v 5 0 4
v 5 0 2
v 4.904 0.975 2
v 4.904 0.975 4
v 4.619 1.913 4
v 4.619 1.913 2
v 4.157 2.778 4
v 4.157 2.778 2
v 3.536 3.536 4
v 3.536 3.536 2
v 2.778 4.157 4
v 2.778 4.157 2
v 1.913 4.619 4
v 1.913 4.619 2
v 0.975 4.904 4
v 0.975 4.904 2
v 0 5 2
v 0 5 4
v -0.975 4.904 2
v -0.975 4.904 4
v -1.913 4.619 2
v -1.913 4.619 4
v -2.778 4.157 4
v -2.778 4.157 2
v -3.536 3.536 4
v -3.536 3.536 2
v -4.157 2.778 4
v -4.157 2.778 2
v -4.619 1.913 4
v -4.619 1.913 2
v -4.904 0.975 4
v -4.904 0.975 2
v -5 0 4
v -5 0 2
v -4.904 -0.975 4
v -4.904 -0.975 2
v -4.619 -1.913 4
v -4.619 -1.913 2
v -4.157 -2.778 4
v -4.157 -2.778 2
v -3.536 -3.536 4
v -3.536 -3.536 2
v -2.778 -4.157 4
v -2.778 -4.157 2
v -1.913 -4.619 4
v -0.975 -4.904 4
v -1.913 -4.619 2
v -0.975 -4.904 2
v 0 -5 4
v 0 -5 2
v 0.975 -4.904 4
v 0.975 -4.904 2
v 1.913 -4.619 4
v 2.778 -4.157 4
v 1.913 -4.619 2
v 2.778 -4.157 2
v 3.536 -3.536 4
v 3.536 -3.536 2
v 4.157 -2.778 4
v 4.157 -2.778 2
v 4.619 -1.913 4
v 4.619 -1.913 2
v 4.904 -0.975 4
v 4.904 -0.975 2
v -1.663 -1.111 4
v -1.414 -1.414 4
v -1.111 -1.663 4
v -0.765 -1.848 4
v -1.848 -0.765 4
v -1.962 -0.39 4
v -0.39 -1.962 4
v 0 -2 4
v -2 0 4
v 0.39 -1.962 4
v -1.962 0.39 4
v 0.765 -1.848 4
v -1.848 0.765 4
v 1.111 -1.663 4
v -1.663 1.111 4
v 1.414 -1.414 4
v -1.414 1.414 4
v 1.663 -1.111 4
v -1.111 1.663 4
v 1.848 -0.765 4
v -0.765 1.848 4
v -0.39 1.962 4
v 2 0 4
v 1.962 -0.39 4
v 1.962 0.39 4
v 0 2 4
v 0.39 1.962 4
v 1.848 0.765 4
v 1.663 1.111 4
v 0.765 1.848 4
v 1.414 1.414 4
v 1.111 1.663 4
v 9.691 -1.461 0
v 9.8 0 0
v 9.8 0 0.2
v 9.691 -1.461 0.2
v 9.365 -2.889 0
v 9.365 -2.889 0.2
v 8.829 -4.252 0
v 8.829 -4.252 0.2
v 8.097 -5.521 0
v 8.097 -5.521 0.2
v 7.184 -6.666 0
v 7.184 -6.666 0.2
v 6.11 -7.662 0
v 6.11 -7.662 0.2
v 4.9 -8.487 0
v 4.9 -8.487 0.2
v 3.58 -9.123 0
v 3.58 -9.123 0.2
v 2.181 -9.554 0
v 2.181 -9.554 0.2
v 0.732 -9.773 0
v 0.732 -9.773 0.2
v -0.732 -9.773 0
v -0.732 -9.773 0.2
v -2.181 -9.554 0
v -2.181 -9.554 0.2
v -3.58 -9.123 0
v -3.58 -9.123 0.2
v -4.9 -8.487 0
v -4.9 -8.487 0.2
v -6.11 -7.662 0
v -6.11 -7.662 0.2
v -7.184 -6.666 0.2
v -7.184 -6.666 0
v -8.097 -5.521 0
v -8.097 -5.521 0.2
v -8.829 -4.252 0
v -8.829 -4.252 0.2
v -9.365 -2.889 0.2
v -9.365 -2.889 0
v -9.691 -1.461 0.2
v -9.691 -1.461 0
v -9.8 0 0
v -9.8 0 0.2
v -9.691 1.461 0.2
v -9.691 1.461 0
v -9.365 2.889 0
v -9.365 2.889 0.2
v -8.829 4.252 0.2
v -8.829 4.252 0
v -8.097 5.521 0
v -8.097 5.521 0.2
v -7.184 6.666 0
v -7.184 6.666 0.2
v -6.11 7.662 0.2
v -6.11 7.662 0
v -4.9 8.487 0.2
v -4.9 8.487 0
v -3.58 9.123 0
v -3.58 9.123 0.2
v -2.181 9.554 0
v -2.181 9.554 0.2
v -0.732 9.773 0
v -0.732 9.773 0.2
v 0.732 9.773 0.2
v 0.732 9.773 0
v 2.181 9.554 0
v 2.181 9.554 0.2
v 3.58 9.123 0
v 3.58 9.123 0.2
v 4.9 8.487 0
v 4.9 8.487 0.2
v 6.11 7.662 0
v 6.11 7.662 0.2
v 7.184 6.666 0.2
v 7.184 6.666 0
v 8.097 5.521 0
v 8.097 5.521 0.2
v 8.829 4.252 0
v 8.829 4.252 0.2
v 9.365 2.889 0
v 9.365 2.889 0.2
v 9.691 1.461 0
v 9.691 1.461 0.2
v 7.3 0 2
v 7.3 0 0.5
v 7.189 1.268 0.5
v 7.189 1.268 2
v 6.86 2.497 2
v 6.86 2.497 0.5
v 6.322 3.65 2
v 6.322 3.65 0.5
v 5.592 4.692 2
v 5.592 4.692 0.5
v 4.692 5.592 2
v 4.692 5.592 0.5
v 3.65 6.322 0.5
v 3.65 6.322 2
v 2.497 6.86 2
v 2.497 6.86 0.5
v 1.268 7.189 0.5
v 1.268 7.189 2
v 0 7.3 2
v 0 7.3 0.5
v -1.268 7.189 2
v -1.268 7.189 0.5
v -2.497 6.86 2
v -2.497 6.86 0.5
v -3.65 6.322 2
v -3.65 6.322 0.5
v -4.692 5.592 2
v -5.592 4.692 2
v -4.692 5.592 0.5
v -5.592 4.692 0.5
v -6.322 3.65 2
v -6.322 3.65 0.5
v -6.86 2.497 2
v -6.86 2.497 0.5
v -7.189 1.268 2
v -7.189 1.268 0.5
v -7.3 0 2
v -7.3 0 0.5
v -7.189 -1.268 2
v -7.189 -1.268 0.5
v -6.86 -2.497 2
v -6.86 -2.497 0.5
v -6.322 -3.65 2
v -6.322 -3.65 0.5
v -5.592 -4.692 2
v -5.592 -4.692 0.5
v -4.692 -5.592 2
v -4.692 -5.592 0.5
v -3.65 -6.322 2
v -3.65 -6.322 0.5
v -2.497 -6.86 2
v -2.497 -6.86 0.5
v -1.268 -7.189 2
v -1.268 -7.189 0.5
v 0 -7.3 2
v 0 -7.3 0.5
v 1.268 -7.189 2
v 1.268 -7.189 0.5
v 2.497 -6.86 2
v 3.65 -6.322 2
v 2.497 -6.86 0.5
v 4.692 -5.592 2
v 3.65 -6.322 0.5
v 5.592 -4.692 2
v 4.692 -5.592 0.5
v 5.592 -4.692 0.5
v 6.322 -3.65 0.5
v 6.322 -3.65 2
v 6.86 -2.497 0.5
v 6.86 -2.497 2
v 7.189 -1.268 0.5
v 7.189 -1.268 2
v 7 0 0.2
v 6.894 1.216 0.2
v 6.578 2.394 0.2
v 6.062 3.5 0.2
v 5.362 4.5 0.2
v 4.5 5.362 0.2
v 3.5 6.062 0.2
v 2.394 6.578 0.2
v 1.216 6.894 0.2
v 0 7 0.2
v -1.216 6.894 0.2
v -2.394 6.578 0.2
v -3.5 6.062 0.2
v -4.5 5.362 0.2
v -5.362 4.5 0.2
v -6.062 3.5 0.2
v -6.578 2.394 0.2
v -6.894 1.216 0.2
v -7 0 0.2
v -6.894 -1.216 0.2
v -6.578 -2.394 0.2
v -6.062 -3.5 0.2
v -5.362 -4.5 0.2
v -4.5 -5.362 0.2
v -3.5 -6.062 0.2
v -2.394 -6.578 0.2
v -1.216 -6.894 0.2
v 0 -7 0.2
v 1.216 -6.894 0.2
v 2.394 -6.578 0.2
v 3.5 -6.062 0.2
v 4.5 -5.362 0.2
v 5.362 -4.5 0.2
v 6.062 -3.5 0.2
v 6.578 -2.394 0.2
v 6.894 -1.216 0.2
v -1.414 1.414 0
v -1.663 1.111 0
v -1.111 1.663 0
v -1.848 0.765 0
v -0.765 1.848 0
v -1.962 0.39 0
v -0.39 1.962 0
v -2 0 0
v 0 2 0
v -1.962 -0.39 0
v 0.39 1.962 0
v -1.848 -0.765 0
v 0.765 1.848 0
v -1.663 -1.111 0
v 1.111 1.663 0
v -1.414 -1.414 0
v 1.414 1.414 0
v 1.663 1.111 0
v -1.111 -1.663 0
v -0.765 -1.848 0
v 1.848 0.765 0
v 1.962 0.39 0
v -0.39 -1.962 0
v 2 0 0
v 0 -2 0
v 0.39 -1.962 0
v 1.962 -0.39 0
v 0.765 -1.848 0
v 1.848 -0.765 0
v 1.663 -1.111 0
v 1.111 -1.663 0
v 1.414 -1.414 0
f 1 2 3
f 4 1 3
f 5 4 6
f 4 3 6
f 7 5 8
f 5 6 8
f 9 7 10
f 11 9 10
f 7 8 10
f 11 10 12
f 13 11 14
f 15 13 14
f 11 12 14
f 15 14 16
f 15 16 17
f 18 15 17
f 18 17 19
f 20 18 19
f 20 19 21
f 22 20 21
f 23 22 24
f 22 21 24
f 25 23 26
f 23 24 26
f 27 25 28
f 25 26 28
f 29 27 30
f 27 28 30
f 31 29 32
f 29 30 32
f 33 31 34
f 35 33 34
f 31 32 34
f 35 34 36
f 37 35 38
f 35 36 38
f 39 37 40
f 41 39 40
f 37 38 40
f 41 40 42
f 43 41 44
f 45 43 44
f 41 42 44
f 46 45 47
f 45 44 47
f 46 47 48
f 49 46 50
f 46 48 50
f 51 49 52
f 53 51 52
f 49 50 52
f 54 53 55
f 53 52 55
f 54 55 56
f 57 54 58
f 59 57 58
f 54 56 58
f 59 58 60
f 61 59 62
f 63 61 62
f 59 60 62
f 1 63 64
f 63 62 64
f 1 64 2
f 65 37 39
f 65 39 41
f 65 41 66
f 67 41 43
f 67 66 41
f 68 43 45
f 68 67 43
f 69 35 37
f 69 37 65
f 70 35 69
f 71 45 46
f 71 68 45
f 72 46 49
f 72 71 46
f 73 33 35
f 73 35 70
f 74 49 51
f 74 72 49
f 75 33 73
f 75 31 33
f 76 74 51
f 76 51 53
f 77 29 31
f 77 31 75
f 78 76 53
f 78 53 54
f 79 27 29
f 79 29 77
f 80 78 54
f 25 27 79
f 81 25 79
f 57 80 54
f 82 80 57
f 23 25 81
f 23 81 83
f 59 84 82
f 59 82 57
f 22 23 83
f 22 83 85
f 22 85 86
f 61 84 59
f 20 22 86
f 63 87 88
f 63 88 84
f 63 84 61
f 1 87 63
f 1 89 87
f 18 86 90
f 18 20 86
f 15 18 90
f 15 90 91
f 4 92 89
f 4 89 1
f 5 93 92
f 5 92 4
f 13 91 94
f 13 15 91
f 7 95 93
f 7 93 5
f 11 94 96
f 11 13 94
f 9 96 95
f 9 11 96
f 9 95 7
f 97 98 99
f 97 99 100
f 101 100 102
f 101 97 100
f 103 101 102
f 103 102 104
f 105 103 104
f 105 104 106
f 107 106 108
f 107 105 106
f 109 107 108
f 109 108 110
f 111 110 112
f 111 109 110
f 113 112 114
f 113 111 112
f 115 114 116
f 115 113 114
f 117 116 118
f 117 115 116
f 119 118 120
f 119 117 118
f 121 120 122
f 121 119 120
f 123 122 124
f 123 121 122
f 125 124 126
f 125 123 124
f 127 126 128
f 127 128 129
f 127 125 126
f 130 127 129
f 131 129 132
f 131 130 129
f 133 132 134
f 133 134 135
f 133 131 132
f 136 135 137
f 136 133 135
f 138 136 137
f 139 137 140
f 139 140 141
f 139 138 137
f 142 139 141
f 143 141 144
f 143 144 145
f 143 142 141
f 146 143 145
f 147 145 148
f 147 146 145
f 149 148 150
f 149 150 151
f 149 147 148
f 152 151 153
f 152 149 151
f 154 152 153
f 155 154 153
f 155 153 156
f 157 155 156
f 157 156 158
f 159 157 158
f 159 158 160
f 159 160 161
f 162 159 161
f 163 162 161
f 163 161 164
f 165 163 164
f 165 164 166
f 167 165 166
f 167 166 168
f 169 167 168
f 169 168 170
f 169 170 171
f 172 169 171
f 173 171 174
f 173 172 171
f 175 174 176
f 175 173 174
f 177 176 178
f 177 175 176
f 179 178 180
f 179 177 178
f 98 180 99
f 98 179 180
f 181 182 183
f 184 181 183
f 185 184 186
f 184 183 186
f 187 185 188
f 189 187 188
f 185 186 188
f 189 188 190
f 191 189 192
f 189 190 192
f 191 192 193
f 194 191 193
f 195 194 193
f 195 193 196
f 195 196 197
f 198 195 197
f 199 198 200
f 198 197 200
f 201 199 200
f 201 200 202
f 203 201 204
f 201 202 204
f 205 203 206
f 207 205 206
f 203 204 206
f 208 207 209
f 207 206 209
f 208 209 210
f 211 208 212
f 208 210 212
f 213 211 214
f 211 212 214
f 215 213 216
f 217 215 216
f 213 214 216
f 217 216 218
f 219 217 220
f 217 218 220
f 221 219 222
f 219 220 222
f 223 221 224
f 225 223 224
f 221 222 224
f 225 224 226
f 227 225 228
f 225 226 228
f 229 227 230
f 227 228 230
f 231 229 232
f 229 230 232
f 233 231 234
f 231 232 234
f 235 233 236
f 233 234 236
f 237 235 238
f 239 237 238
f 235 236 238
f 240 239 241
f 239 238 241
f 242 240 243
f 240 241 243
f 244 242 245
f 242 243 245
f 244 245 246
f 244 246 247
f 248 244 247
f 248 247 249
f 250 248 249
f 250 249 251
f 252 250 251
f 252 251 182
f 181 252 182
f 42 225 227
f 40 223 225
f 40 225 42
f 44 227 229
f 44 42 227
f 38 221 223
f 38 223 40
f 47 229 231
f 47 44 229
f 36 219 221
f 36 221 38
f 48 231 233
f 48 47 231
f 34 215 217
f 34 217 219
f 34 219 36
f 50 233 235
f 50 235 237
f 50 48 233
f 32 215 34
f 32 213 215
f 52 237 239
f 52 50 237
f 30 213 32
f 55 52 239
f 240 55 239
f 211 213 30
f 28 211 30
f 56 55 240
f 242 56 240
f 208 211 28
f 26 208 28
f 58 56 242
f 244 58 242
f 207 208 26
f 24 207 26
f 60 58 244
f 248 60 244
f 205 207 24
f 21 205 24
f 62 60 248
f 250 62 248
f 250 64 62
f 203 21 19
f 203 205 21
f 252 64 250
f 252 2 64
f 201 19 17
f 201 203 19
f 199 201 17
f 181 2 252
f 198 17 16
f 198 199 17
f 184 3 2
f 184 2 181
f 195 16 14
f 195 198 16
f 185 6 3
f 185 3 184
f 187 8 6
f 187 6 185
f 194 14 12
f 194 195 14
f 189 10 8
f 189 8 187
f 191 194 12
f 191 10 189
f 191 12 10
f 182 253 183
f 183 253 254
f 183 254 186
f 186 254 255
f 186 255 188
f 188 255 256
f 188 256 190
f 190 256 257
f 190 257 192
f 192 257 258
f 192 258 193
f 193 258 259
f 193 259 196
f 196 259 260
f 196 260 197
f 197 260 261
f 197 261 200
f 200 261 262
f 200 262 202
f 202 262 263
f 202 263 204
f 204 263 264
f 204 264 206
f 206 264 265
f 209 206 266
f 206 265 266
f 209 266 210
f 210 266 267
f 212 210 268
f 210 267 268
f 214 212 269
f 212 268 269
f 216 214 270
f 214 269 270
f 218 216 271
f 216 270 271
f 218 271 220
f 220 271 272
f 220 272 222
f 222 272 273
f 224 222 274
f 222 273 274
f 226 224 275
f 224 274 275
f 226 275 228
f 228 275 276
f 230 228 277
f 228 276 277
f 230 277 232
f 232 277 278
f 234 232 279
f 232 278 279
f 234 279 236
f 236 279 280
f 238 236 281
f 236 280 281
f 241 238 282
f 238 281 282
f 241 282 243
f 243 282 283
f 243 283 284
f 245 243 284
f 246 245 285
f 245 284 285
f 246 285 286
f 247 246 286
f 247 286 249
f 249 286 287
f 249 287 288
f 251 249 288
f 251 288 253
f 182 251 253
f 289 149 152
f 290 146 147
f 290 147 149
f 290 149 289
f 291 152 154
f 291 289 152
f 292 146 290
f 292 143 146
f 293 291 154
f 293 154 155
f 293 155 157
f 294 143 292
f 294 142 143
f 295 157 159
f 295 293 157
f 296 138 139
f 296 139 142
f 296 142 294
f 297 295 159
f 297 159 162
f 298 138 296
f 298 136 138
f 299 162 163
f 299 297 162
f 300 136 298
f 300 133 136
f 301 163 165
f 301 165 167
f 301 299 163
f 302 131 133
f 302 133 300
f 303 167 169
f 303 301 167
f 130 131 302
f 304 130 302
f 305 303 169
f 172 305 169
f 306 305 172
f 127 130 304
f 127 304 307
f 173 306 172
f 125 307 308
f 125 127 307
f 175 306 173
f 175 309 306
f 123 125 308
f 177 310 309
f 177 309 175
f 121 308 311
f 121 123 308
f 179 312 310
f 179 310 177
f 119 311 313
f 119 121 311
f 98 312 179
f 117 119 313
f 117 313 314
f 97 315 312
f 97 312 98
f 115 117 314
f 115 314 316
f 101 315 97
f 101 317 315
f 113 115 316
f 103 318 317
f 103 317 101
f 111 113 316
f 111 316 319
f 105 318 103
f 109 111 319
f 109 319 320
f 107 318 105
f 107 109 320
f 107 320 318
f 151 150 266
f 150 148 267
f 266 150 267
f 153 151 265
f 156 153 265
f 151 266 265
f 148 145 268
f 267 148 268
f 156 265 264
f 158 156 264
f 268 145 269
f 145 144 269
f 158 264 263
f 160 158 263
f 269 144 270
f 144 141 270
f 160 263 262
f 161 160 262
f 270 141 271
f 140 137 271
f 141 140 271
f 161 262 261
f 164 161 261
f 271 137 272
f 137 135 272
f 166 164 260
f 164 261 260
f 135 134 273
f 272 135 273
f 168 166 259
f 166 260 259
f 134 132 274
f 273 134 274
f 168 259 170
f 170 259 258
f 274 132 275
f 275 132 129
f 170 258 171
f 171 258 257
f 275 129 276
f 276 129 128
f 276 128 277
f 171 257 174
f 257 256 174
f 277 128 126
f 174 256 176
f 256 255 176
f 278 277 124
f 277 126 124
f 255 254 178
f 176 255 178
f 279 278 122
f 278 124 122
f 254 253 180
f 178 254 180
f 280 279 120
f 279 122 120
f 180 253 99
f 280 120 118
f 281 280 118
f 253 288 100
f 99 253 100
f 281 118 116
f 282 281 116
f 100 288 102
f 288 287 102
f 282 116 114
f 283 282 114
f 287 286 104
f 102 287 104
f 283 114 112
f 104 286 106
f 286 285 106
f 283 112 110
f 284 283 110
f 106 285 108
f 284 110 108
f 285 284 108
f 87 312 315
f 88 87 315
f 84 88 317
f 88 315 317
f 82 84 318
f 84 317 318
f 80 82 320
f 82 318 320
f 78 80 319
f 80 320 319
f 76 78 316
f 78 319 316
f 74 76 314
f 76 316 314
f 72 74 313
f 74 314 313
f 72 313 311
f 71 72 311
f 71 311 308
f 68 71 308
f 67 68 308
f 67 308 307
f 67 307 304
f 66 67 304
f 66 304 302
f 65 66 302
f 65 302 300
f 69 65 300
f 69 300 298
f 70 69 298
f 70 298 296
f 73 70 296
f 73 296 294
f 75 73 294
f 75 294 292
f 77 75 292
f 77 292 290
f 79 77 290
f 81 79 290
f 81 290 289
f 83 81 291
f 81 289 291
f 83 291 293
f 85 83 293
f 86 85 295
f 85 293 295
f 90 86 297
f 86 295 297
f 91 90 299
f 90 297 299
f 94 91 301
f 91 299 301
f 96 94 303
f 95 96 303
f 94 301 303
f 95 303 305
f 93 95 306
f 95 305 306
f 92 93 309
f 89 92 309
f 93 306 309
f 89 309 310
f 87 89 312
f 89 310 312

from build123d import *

# Parameters (mm, degrees)
F0_R     = 7.3
F1_DEPTH = 2
F2_R     = 5
F3_DEPTH = 2
F4_SIZE  = 0.5
F5_R     = 2
F6_DEPTH = 4.001
F7_R     = 9.8
F7_R_2   = 6.8
F8_DEPTH = 0.2


with BuildPart() as f1:
    # F0 (on Top) → F1 (new body)
    with BuildSketch(Plane.XY):
        Circle(F0_R)
    extrude(amount=F1_DEPTH)

    # F2 (on face) → F3 (join)
    with BuildSketch(Plane.XY.offset(2)):
        Circle(F2_R)
    extrude(amount=F3_DEPTH)

    # F4
    f4_edges = [f1.edges().sort_by_distance(p)[0] for p in [
        (-7.3, 0, 0),
    ]]
    chamfer(f4_edges, length=F4_SIZE)

    # F5 (on face) → F6 (cut, through all)
    with BuildSketch(Plane(origin=(0, 0, 0), x_dir=(1, 0, 0), z_dir=(0, 0, -1))):
        Circle(F5_R)
    extrude(amount=-F6_DEPTH, mode=Mode.SUBTRACT)

    # F7 (on face) → F8 (join)
    with BuildSketch(Plane(origin=(0, 0, 0), x_dir=(1, 0, 0), z_dir=(0, 0, -1))):
        Circle(F7_R)
        Circle(F7_R_2, mode=Mode.SUBTRACT)
    extrude(amount=-F8_DEPTH)


solid = f1.part
